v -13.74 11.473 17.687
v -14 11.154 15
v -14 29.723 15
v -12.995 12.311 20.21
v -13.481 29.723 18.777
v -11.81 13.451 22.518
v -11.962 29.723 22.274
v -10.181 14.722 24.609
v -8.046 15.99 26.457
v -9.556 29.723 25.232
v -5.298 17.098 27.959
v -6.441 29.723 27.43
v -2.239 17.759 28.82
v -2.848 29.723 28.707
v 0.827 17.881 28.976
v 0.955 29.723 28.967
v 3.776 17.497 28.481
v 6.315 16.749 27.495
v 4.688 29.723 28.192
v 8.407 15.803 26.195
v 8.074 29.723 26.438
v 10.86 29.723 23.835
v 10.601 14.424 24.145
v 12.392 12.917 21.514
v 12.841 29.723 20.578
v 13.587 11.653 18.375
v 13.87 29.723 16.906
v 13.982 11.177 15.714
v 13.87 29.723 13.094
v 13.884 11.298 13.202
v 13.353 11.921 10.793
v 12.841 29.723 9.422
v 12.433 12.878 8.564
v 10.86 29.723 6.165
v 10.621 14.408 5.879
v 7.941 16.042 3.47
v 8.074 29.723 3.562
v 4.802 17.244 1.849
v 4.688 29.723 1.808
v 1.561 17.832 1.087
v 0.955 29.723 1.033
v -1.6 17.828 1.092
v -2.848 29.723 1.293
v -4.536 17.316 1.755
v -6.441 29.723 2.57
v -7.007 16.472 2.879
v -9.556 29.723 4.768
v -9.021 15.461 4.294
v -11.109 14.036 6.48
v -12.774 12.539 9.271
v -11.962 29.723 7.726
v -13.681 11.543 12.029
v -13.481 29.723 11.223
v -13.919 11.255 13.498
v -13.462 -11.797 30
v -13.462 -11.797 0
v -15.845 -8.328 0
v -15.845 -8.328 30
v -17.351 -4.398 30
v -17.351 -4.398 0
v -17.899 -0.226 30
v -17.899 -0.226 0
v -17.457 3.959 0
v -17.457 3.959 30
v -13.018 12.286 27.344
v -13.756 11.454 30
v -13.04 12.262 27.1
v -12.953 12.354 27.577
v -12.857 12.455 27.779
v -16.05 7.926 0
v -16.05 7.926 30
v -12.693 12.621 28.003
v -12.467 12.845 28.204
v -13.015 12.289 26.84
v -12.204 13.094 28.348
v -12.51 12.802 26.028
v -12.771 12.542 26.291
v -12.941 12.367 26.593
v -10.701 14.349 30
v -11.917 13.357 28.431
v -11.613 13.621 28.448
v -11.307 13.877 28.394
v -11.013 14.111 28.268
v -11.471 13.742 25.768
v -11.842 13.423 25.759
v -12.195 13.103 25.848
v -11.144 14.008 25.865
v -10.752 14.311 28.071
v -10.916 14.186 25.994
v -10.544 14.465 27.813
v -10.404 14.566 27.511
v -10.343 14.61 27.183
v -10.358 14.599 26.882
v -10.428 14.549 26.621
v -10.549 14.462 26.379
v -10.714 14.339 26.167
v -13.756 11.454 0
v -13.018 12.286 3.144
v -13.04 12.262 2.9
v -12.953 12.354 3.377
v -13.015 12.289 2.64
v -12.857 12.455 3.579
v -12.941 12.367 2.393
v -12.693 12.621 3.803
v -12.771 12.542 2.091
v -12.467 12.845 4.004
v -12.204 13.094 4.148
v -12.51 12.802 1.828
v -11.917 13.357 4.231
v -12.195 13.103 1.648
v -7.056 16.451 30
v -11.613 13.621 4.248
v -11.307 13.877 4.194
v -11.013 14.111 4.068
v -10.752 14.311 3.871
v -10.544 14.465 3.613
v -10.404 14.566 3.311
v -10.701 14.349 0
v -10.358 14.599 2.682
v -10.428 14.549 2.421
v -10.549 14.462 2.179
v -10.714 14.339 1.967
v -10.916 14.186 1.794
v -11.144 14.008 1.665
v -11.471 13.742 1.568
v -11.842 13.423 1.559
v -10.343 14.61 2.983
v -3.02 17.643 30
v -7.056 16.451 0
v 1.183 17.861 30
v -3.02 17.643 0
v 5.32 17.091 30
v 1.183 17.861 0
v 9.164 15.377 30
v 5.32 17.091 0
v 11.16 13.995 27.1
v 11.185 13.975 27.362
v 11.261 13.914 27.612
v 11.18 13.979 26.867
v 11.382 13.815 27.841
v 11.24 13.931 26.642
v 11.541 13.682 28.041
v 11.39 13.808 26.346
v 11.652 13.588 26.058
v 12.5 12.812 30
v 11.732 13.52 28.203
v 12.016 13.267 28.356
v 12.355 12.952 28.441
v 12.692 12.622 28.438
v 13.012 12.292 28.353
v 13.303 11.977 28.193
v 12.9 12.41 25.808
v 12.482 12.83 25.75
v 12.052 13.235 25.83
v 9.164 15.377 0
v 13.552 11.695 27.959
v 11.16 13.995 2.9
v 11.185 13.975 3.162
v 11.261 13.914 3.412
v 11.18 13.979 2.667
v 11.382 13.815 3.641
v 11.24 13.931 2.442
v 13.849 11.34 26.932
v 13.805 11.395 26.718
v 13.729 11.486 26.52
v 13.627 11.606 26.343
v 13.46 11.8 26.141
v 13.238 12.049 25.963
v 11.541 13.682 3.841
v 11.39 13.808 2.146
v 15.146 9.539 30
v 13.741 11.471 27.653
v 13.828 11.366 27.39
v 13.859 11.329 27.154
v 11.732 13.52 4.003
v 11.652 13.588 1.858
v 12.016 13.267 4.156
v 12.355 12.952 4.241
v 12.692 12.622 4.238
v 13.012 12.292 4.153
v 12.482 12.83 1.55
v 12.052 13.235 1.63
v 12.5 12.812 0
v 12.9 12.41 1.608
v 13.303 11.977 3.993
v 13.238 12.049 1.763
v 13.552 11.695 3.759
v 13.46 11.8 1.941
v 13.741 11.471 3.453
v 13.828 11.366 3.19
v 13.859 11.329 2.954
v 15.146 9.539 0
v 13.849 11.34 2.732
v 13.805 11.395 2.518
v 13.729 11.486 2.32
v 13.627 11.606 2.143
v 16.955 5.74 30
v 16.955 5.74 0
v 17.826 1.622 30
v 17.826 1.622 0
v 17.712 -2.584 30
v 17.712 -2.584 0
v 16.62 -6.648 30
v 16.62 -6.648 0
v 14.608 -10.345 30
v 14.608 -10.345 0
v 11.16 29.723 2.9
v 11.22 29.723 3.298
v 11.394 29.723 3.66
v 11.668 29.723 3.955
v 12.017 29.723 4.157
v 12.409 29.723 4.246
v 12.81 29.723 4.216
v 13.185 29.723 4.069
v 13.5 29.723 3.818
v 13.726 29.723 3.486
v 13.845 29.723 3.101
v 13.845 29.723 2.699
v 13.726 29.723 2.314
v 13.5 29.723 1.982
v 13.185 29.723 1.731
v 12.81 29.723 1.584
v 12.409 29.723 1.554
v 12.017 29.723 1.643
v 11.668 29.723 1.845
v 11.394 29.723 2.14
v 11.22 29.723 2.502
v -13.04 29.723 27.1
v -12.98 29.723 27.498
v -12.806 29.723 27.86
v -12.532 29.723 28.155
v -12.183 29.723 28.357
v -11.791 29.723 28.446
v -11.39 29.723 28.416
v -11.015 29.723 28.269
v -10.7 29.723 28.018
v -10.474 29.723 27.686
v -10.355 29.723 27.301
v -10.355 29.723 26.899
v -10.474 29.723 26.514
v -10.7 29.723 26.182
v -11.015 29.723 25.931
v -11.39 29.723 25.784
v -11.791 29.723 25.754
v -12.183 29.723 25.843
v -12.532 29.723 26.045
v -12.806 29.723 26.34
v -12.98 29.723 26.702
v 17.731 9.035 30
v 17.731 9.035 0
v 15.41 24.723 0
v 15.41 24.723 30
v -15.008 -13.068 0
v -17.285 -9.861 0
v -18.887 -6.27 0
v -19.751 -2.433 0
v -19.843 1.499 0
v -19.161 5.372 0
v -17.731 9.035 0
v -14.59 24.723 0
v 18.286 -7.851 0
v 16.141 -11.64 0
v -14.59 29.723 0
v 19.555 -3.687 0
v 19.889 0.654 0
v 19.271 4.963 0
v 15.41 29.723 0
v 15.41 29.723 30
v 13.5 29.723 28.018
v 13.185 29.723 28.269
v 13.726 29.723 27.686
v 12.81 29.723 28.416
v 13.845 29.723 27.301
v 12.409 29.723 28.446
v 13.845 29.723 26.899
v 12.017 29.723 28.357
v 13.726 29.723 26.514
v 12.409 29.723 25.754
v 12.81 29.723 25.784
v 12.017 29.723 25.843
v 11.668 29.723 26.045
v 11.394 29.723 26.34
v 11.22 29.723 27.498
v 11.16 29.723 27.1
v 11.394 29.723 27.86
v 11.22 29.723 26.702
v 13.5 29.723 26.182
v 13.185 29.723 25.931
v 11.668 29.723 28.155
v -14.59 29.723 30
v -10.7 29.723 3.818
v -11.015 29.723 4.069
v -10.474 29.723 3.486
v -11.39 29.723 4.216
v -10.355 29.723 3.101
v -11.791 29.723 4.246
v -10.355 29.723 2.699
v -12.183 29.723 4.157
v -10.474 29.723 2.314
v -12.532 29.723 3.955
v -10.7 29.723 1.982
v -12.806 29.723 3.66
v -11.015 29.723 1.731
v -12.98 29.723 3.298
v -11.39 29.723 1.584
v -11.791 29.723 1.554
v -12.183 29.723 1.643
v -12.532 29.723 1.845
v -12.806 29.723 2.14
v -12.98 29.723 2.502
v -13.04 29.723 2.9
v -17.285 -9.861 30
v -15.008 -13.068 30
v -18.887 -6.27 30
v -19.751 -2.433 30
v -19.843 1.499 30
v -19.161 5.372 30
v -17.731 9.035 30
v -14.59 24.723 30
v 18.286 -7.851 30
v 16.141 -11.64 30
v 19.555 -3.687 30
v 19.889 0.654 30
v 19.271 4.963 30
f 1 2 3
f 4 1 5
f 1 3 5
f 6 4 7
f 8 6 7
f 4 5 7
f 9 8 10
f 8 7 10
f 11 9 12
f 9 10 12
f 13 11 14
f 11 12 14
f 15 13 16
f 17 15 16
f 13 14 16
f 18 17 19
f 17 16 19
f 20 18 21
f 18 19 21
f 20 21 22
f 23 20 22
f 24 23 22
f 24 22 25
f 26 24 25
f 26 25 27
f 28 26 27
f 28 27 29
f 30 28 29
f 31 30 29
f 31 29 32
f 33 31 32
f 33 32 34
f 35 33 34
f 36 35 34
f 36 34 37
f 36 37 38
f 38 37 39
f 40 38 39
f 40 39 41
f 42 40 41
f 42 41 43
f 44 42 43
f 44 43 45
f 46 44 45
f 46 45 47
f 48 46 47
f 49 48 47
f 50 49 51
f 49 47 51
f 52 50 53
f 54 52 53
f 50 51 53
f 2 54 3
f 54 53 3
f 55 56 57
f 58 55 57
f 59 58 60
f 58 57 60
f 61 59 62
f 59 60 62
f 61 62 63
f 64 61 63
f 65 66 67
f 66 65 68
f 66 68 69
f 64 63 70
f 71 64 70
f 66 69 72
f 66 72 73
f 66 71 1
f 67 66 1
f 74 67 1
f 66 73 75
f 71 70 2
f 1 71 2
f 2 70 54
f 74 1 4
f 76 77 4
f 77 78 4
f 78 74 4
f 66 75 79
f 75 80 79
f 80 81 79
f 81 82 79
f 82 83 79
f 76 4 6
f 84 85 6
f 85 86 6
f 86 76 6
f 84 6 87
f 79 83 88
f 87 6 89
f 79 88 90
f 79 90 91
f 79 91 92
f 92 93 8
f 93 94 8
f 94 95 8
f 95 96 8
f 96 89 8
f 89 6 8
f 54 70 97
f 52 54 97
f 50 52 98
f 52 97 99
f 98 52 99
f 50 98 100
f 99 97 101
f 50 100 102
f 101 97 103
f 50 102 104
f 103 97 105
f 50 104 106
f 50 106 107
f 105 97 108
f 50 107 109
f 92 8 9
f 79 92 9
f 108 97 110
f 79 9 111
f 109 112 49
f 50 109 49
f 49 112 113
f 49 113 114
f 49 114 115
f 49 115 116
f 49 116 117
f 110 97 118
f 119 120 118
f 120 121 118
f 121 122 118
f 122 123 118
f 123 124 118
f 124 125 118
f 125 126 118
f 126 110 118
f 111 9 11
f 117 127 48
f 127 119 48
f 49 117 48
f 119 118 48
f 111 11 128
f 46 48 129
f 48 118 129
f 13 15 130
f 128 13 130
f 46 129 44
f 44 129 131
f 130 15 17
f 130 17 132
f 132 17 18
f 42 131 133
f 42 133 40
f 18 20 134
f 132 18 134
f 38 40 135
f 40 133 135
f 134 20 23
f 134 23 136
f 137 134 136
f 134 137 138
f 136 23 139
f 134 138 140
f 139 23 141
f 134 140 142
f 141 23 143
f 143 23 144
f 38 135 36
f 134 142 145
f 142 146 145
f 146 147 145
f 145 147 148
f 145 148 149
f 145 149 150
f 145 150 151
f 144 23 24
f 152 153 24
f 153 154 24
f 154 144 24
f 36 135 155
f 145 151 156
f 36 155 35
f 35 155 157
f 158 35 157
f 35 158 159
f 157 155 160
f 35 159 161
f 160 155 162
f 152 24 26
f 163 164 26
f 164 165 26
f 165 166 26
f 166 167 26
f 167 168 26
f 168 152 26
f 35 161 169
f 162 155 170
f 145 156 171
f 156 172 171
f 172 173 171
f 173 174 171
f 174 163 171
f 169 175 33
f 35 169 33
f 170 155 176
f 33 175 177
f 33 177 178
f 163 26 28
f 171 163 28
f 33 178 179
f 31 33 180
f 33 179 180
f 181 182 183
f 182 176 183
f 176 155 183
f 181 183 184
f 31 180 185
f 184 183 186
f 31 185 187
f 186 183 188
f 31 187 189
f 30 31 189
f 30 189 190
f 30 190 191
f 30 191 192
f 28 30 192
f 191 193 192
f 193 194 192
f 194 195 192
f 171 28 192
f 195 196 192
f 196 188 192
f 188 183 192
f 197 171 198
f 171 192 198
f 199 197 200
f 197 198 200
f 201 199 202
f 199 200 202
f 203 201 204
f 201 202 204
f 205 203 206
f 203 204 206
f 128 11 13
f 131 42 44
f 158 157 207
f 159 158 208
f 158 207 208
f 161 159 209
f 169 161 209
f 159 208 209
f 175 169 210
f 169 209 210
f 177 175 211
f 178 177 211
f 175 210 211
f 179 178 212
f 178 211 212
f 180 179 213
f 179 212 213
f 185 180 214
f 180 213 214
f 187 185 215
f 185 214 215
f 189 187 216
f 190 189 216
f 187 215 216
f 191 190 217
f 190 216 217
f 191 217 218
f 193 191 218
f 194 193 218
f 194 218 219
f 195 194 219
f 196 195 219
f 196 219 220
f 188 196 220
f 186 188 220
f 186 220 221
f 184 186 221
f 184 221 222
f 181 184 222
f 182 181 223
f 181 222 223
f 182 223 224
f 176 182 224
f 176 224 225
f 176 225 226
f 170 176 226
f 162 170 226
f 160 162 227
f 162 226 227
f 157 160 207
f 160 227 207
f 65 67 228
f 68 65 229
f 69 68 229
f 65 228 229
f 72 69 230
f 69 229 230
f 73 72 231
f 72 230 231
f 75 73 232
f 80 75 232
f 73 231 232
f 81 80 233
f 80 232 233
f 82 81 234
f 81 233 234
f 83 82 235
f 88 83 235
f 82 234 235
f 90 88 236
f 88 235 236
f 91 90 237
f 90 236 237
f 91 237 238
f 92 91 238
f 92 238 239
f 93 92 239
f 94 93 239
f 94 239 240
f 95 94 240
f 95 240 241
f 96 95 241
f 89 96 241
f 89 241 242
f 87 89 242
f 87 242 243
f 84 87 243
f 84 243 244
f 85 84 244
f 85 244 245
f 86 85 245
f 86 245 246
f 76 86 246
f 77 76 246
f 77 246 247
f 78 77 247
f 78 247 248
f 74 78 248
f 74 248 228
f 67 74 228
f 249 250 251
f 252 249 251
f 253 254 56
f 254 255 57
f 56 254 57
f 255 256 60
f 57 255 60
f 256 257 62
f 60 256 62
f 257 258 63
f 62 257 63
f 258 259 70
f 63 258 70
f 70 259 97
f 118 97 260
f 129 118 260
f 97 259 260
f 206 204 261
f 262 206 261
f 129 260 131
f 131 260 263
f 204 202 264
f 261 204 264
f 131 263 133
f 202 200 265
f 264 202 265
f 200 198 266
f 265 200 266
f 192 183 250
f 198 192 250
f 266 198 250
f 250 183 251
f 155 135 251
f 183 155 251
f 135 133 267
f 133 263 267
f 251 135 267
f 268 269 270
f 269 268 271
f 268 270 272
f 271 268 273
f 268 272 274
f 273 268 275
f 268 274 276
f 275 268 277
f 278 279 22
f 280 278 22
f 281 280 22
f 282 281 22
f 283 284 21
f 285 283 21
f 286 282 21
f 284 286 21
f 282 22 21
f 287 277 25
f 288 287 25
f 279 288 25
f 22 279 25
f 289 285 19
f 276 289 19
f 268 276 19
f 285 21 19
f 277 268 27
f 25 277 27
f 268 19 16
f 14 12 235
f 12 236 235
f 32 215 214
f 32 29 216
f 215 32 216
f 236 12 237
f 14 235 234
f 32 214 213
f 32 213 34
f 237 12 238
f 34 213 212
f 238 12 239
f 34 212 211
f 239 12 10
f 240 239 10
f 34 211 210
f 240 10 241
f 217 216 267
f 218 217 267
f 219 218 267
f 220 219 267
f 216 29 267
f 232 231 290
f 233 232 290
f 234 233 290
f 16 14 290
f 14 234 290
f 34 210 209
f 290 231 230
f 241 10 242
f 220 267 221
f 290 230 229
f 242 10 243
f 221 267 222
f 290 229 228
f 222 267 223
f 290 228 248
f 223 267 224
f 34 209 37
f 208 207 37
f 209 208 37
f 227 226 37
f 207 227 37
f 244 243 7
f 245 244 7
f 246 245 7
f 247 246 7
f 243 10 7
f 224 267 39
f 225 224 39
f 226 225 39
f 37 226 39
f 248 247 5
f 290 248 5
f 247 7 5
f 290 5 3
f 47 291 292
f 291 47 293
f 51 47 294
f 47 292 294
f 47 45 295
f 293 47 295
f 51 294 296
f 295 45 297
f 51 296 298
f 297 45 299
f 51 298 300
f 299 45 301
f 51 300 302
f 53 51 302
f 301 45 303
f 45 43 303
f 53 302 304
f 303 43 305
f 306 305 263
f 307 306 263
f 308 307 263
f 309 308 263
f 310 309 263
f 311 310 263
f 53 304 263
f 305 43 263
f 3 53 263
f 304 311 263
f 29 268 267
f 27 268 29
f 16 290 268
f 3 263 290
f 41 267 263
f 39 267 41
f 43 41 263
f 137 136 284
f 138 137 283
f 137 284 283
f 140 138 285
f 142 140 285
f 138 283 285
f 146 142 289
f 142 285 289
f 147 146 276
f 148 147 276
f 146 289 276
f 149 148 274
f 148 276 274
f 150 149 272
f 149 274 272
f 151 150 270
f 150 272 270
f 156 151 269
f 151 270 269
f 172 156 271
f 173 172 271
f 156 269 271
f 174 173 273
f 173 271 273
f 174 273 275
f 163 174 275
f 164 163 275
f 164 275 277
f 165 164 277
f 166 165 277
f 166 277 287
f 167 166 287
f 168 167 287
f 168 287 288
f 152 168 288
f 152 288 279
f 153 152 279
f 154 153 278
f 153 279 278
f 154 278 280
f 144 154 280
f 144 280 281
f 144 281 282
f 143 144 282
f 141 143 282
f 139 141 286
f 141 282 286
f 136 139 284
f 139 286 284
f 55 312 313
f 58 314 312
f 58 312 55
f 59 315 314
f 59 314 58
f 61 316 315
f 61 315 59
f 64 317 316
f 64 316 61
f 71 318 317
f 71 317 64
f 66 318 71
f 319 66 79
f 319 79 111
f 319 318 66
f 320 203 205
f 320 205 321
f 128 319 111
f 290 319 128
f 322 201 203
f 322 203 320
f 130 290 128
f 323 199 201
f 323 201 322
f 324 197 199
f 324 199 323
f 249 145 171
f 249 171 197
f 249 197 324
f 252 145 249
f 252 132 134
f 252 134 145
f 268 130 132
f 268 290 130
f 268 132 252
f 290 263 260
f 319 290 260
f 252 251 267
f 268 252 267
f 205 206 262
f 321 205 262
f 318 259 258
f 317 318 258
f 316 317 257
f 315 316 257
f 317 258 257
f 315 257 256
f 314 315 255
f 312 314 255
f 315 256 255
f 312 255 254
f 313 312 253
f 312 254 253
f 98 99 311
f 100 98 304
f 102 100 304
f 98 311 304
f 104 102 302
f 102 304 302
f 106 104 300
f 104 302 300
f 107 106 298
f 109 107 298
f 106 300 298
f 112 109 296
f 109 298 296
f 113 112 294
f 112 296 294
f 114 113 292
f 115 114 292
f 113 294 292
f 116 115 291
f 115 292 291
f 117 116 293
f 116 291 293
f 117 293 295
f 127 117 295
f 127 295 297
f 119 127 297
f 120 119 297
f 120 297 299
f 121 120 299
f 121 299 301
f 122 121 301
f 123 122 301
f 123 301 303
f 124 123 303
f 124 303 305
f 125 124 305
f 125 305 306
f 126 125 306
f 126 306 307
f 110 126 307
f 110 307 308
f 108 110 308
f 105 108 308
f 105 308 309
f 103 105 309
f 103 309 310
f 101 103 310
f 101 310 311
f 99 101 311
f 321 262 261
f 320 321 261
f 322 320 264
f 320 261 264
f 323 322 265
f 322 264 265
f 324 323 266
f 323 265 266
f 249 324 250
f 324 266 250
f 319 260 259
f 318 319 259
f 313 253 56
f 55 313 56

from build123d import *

# Parameters (mm, degrees)
F1_DEPTH = 30
F2_R     = 1.35
F2_R_2   = 14
F3_DEPTH = 25


with BuildPart() as f1:
    # F0 (on Top) → F1 (new body)
    with BuildSketch(Plane.XY):
        with BuildLine():
            ThreePointArc((-13.462473, -11.797111), (-0.924812, 17.876094), (14.60798, -10.344899))
            Line((14.60798, -10.344899), (16.140658, -11.639981))
            ThreePointArc((16.140658, -11.639981), (19.841413, -1.525887), (17.73066, 9.035137))
            Line((17.73066, 9.035137), (15.409903, 24.723038))
            Line((15.409903, 24.723038), (15.409903, 29.723038))
            Line((15.409903, 29.723038), (-14.590097, 29.723038))
            Line((-14.590097, 29.723038), (-14.590097, 24.723038))
            Line((-14.590097, 24.723038), (-17.73066, 9.035137))
            ThreePointArc((-17.73066, 9.035137), (-19.750704, -2.43304), (-15.007816, -13.068109))
            Line((-15.007816, -13.068109), (-13.462473, -11.797111))
        make_face()
    extrude(amount=F1_DEPTH)

    # F2 (on face) → F3 (cut)
    with BuildSketch(Plane(origin=(0, 29.723038, 0), x_dir=(-1, 0, 0), z_dir=(0, 1, 0))):
        with Locations((-12.509903, 27.1)):
            Circle(F2_R)
        with Locations((-12.509903, 2.9)):
            Circle(F2_R)
        with Locations((11.690097, 2.9)):
            Circle(F2_R)
        with Locations((11.690097, 27.1)):
            Circle(F2_R)
        with Locations((0, 15)):
            Circle(F2_R_2)
    extrude(amount=-F3_DEPTH, mode=Mode.SUBTRACT)


solid = f1.part
